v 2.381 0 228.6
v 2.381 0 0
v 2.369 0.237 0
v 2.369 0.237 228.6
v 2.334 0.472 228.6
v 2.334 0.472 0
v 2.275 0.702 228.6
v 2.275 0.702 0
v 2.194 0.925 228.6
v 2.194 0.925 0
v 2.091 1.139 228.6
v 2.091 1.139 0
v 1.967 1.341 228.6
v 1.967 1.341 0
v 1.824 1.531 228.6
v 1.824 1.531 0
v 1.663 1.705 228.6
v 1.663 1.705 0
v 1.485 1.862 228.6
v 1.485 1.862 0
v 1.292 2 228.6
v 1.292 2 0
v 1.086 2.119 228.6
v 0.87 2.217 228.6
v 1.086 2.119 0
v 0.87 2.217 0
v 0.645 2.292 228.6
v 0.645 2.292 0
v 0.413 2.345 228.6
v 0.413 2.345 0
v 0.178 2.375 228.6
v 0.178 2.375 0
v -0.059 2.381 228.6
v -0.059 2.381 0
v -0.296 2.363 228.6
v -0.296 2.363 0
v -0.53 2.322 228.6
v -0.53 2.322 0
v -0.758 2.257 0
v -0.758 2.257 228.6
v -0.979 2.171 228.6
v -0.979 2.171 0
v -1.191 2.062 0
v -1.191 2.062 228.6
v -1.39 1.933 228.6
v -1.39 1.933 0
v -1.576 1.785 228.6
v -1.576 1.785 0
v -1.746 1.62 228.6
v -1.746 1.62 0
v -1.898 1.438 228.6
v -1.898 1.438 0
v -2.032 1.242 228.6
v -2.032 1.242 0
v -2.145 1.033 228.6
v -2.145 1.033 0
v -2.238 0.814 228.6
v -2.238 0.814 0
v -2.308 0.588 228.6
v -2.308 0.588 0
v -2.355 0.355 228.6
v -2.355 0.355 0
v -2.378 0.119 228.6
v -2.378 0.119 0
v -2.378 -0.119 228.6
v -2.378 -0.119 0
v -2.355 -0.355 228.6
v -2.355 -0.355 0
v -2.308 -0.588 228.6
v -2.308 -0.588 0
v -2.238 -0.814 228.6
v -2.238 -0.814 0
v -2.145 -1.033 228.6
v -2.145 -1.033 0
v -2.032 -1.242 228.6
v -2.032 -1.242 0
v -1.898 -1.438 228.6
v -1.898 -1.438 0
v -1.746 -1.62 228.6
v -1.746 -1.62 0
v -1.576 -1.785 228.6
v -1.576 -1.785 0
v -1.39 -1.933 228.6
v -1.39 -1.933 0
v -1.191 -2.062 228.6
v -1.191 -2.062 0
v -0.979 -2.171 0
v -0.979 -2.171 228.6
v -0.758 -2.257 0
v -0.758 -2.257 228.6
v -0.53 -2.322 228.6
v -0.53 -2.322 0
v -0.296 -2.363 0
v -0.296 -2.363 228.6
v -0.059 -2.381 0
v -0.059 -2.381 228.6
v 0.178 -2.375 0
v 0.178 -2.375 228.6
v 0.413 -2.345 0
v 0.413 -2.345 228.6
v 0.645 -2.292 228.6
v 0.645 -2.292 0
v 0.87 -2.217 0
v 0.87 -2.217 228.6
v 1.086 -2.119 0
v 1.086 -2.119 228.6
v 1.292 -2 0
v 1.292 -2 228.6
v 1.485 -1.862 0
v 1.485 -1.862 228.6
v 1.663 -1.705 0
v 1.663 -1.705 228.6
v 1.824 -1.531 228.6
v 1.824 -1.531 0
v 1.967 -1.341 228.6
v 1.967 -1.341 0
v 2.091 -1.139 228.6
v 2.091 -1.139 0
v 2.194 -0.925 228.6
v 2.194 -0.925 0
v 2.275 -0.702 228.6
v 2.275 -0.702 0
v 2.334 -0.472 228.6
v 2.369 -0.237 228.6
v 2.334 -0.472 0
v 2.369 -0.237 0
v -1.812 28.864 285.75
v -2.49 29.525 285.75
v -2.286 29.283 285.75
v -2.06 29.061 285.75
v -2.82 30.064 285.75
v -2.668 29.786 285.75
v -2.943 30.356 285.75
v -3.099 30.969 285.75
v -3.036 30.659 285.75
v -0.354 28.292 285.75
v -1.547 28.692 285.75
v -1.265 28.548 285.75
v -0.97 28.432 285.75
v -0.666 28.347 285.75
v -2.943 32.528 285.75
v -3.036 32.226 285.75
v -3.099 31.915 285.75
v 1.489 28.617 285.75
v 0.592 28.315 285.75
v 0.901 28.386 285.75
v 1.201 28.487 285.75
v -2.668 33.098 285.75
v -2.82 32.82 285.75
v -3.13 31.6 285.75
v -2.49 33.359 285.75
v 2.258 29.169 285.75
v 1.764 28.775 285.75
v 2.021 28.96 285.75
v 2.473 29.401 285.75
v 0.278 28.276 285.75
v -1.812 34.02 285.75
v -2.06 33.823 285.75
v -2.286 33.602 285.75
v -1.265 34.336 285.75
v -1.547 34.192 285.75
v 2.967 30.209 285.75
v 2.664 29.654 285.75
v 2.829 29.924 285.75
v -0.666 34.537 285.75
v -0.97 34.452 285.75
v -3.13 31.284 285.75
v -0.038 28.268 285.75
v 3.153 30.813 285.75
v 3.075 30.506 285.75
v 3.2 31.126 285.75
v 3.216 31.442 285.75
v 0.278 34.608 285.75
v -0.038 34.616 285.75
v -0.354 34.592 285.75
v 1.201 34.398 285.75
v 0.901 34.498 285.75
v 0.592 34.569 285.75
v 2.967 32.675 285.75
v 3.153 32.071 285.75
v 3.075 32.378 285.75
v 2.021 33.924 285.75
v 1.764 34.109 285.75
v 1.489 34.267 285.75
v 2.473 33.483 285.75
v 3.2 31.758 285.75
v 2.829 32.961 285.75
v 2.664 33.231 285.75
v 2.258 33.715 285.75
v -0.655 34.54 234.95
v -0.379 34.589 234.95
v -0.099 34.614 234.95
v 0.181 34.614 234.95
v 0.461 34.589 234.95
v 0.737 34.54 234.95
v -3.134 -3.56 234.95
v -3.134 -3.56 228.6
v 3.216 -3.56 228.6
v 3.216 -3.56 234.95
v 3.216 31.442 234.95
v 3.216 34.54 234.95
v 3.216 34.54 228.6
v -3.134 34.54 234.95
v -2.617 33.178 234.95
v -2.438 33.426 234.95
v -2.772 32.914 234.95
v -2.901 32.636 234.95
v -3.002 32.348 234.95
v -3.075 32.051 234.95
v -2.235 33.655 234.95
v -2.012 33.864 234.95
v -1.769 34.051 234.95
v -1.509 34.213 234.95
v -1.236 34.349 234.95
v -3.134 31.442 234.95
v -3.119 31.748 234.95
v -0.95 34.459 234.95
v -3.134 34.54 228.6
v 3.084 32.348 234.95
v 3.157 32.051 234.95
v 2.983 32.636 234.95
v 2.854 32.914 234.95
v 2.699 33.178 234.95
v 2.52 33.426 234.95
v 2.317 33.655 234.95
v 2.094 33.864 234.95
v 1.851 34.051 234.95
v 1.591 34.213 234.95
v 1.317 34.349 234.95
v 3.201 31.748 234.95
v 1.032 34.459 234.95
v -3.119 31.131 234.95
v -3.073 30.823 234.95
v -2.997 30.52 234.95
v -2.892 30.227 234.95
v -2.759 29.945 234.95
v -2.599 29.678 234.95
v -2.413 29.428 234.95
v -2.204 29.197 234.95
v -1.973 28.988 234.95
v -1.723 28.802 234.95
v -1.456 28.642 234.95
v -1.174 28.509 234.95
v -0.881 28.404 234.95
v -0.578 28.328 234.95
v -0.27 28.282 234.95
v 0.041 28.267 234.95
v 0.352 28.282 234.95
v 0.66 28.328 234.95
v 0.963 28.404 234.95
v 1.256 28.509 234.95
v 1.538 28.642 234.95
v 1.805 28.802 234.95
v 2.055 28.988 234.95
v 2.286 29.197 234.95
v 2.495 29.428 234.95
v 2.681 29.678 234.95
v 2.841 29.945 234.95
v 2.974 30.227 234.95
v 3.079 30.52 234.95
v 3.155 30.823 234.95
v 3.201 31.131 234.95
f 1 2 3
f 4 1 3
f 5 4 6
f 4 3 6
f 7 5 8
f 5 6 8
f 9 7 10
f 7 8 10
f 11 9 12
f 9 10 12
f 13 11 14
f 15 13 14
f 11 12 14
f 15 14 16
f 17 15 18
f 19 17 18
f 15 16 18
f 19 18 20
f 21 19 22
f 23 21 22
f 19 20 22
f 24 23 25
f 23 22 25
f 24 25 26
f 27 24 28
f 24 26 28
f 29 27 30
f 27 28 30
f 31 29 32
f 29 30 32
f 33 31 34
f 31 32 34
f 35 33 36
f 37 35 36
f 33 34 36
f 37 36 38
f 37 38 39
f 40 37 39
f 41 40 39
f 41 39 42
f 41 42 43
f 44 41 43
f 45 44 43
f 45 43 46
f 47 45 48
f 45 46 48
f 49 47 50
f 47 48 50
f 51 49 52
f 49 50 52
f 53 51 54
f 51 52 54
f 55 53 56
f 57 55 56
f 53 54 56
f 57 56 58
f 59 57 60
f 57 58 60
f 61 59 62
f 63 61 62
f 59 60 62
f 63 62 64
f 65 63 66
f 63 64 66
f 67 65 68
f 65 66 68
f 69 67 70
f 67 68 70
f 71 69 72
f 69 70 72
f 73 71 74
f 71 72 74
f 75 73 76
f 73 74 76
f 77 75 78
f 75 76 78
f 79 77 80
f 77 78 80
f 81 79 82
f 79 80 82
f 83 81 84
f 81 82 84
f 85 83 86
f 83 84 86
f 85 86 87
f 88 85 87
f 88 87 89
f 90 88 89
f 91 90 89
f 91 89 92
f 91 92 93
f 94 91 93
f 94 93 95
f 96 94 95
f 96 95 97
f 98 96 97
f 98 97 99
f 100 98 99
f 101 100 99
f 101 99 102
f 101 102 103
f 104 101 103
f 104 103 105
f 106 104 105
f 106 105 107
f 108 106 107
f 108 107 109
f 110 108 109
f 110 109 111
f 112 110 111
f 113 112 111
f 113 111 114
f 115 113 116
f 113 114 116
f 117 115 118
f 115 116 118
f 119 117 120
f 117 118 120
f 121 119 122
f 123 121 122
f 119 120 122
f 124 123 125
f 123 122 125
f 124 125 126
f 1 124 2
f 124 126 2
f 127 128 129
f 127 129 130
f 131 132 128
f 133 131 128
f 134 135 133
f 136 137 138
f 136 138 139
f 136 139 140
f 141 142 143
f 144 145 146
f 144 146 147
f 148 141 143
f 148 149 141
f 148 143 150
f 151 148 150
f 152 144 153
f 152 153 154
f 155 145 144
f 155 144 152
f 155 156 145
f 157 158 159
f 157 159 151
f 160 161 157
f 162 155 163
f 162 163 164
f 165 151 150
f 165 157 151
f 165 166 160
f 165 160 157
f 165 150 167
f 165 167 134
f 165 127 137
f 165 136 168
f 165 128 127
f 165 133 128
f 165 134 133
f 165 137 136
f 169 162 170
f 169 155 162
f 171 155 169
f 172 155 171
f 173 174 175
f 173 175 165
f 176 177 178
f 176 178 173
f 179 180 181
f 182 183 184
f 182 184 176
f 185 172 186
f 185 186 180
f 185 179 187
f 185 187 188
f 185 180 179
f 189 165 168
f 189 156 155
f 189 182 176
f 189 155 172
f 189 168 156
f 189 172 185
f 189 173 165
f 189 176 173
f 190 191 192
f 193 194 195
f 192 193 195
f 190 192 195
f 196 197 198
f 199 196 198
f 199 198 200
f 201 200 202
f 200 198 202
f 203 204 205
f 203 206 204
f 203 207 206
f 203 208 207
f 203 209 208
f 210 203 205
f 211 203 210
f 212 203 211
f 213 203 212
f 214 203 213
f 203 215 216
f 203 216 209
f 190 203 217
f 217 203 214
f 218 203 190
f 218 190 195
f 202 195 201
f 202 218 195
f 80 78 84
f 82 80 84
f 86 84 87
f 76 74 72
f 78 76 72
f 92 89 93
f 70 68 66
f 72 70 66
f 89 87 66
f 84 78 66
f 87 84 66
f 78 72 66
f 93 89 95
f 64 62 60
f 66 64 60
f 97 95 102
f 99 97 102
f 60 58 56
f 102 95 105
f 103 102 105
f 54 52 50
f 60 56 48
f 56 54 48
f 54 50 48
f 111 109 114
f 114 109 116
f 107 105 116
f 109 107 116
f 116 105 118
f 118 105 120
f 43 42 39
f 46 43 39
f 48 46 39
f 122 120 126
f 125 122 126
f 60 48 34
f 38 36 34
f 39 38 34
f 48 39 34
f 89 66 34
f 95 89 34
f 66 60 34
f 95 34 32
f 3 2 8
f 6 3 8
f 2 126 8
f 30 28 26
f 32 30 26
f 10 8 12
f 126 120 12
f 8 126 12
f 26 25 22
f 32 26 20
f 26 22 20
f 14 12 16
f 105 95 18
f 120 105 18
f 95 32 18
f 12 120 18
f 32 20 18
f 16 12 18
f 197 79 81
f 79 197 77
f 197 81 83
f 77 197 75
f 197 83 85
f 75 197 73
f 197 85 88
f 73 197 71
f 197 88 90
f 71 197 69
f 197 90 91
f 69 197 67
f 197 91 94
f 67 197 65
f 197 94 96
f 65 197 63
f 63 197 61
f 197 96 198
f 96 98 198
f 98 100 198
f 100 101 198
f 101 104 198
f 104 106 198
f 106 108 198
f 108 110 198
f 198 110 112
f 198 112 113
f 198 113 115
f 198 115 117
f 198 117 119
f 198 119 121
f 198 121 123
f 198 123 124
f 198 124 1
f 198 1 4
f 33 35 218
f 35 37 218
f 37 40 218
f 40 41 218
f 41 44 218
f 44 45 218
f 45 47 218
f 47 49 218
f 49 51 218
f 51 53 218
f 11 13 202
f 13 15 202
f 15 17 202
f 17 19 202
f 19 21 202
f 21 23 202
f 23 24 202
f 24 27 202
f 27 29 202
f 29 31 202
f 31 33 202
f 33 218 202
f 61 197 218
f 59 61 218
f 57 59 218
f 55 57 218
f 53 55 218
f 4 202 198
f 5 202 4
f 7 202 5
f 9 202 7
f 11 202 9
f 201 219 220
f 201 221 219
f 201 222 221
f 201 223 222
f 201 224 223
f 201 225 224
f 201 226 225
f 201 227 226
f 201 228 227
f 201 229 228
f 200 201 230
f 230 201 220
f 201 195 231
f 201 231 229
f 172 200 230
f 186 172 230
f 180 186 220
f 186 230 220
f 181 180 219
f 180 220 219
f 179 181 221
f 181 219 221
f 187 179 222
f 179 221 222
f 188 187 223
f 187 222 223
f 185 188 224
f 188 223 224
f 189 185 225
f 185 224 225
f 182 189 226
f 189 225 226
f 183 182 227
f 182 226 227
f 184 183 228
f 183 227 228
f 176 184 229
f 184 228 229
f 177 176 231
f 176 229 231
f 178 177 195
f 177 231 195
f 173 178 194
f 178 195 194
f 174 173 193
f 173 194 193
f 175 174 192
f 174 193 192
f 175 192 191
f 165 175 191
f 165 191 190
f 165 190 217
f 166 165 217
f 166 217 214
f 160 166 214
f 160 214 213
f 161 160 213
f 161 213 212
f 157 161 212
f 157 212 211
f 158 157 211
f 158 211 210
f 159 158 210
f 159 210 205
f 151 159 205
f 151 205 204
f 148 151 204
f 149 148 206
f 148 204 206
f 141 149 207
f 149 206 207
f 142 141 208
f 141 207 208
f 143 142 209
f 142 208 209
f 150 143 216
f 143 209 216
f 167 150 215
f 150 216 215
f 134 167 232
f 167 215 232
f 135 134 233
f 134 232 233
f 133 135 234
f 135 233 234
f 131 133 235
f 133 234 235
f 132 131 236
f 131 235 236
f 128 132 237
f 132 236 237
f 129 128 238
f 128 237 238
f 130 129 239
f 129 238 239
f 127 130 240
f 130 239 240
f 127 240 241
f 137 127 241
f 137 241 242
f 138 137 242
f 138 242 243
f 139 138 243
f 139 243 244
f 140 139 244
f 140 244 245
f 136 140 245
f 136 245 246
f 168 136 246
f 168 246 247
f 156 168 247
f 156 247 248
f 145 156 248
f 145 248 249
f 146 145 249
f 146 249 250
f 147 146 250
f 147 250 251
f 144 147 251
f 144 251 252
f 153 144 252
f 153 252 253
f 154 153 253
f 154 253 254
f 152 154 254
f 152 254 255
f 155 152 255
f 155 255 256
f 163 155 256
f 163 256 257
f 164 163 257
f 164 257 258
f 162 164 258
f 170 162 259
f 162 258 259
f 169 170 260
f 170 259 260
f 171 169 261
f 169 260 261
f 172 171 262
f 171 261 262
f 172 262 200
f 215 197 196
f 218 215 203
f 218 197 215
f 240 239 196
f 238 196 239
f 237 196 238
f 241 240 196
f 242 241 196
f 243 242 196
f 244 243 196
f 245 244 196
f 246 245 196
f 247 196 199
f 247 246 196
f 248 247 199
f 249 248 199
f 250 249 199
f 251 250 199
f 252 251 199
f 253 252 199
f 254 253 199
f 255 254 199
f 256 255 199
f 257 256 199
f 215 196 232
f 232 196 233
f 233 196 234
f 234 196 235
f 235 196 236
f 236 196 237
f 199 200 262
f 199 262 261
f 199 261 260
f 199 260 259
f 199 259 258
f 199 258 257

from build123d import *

# Parameters (mm, degrees)
SKETCH1_R           = 2.38125
BOSS_EXTRUDE1_DEPTH = 228.6
SKETCH2_W           = 6.35
SKETCH2_H           = 38.1
BOSS_EXTRUDE2_DEPTH = 6.35
SKETCH3_R           = 3.175
BOSS_EXTRUDE3_DEPTH = 50.8


with BuildPart() as part:
    # Sketch1 → Boss-Extrude1 (new body)
    with BuildSketch(Plane.XY):
        Circle(SKETCH1_R)
    extrude(amount=BOSS_EXTRUDE1_DEPTH)

    # Sketch2 → Boss-Extrude2 (add)
    with BuildSketch(Plane.XY.offset(228.6)):
        with Locations((0.040964163, 15.489894183)):
            Rectangle(SKETCH2_W, SKETCH2_H)
    extrude(amount=BOSS_EXTRUDE2_DEPTH)

    # Sketch3 → Boss-Extrude3 (add)
    with BuildSketch(Plane.XY.offset(234.95)):
        with Locations((0.040964163, 31.442054565)):
            Circle(SKETCH3_R)
    extrude(amount=BOSS_EXTRUDE3_DEPTH)


solid = part.part
